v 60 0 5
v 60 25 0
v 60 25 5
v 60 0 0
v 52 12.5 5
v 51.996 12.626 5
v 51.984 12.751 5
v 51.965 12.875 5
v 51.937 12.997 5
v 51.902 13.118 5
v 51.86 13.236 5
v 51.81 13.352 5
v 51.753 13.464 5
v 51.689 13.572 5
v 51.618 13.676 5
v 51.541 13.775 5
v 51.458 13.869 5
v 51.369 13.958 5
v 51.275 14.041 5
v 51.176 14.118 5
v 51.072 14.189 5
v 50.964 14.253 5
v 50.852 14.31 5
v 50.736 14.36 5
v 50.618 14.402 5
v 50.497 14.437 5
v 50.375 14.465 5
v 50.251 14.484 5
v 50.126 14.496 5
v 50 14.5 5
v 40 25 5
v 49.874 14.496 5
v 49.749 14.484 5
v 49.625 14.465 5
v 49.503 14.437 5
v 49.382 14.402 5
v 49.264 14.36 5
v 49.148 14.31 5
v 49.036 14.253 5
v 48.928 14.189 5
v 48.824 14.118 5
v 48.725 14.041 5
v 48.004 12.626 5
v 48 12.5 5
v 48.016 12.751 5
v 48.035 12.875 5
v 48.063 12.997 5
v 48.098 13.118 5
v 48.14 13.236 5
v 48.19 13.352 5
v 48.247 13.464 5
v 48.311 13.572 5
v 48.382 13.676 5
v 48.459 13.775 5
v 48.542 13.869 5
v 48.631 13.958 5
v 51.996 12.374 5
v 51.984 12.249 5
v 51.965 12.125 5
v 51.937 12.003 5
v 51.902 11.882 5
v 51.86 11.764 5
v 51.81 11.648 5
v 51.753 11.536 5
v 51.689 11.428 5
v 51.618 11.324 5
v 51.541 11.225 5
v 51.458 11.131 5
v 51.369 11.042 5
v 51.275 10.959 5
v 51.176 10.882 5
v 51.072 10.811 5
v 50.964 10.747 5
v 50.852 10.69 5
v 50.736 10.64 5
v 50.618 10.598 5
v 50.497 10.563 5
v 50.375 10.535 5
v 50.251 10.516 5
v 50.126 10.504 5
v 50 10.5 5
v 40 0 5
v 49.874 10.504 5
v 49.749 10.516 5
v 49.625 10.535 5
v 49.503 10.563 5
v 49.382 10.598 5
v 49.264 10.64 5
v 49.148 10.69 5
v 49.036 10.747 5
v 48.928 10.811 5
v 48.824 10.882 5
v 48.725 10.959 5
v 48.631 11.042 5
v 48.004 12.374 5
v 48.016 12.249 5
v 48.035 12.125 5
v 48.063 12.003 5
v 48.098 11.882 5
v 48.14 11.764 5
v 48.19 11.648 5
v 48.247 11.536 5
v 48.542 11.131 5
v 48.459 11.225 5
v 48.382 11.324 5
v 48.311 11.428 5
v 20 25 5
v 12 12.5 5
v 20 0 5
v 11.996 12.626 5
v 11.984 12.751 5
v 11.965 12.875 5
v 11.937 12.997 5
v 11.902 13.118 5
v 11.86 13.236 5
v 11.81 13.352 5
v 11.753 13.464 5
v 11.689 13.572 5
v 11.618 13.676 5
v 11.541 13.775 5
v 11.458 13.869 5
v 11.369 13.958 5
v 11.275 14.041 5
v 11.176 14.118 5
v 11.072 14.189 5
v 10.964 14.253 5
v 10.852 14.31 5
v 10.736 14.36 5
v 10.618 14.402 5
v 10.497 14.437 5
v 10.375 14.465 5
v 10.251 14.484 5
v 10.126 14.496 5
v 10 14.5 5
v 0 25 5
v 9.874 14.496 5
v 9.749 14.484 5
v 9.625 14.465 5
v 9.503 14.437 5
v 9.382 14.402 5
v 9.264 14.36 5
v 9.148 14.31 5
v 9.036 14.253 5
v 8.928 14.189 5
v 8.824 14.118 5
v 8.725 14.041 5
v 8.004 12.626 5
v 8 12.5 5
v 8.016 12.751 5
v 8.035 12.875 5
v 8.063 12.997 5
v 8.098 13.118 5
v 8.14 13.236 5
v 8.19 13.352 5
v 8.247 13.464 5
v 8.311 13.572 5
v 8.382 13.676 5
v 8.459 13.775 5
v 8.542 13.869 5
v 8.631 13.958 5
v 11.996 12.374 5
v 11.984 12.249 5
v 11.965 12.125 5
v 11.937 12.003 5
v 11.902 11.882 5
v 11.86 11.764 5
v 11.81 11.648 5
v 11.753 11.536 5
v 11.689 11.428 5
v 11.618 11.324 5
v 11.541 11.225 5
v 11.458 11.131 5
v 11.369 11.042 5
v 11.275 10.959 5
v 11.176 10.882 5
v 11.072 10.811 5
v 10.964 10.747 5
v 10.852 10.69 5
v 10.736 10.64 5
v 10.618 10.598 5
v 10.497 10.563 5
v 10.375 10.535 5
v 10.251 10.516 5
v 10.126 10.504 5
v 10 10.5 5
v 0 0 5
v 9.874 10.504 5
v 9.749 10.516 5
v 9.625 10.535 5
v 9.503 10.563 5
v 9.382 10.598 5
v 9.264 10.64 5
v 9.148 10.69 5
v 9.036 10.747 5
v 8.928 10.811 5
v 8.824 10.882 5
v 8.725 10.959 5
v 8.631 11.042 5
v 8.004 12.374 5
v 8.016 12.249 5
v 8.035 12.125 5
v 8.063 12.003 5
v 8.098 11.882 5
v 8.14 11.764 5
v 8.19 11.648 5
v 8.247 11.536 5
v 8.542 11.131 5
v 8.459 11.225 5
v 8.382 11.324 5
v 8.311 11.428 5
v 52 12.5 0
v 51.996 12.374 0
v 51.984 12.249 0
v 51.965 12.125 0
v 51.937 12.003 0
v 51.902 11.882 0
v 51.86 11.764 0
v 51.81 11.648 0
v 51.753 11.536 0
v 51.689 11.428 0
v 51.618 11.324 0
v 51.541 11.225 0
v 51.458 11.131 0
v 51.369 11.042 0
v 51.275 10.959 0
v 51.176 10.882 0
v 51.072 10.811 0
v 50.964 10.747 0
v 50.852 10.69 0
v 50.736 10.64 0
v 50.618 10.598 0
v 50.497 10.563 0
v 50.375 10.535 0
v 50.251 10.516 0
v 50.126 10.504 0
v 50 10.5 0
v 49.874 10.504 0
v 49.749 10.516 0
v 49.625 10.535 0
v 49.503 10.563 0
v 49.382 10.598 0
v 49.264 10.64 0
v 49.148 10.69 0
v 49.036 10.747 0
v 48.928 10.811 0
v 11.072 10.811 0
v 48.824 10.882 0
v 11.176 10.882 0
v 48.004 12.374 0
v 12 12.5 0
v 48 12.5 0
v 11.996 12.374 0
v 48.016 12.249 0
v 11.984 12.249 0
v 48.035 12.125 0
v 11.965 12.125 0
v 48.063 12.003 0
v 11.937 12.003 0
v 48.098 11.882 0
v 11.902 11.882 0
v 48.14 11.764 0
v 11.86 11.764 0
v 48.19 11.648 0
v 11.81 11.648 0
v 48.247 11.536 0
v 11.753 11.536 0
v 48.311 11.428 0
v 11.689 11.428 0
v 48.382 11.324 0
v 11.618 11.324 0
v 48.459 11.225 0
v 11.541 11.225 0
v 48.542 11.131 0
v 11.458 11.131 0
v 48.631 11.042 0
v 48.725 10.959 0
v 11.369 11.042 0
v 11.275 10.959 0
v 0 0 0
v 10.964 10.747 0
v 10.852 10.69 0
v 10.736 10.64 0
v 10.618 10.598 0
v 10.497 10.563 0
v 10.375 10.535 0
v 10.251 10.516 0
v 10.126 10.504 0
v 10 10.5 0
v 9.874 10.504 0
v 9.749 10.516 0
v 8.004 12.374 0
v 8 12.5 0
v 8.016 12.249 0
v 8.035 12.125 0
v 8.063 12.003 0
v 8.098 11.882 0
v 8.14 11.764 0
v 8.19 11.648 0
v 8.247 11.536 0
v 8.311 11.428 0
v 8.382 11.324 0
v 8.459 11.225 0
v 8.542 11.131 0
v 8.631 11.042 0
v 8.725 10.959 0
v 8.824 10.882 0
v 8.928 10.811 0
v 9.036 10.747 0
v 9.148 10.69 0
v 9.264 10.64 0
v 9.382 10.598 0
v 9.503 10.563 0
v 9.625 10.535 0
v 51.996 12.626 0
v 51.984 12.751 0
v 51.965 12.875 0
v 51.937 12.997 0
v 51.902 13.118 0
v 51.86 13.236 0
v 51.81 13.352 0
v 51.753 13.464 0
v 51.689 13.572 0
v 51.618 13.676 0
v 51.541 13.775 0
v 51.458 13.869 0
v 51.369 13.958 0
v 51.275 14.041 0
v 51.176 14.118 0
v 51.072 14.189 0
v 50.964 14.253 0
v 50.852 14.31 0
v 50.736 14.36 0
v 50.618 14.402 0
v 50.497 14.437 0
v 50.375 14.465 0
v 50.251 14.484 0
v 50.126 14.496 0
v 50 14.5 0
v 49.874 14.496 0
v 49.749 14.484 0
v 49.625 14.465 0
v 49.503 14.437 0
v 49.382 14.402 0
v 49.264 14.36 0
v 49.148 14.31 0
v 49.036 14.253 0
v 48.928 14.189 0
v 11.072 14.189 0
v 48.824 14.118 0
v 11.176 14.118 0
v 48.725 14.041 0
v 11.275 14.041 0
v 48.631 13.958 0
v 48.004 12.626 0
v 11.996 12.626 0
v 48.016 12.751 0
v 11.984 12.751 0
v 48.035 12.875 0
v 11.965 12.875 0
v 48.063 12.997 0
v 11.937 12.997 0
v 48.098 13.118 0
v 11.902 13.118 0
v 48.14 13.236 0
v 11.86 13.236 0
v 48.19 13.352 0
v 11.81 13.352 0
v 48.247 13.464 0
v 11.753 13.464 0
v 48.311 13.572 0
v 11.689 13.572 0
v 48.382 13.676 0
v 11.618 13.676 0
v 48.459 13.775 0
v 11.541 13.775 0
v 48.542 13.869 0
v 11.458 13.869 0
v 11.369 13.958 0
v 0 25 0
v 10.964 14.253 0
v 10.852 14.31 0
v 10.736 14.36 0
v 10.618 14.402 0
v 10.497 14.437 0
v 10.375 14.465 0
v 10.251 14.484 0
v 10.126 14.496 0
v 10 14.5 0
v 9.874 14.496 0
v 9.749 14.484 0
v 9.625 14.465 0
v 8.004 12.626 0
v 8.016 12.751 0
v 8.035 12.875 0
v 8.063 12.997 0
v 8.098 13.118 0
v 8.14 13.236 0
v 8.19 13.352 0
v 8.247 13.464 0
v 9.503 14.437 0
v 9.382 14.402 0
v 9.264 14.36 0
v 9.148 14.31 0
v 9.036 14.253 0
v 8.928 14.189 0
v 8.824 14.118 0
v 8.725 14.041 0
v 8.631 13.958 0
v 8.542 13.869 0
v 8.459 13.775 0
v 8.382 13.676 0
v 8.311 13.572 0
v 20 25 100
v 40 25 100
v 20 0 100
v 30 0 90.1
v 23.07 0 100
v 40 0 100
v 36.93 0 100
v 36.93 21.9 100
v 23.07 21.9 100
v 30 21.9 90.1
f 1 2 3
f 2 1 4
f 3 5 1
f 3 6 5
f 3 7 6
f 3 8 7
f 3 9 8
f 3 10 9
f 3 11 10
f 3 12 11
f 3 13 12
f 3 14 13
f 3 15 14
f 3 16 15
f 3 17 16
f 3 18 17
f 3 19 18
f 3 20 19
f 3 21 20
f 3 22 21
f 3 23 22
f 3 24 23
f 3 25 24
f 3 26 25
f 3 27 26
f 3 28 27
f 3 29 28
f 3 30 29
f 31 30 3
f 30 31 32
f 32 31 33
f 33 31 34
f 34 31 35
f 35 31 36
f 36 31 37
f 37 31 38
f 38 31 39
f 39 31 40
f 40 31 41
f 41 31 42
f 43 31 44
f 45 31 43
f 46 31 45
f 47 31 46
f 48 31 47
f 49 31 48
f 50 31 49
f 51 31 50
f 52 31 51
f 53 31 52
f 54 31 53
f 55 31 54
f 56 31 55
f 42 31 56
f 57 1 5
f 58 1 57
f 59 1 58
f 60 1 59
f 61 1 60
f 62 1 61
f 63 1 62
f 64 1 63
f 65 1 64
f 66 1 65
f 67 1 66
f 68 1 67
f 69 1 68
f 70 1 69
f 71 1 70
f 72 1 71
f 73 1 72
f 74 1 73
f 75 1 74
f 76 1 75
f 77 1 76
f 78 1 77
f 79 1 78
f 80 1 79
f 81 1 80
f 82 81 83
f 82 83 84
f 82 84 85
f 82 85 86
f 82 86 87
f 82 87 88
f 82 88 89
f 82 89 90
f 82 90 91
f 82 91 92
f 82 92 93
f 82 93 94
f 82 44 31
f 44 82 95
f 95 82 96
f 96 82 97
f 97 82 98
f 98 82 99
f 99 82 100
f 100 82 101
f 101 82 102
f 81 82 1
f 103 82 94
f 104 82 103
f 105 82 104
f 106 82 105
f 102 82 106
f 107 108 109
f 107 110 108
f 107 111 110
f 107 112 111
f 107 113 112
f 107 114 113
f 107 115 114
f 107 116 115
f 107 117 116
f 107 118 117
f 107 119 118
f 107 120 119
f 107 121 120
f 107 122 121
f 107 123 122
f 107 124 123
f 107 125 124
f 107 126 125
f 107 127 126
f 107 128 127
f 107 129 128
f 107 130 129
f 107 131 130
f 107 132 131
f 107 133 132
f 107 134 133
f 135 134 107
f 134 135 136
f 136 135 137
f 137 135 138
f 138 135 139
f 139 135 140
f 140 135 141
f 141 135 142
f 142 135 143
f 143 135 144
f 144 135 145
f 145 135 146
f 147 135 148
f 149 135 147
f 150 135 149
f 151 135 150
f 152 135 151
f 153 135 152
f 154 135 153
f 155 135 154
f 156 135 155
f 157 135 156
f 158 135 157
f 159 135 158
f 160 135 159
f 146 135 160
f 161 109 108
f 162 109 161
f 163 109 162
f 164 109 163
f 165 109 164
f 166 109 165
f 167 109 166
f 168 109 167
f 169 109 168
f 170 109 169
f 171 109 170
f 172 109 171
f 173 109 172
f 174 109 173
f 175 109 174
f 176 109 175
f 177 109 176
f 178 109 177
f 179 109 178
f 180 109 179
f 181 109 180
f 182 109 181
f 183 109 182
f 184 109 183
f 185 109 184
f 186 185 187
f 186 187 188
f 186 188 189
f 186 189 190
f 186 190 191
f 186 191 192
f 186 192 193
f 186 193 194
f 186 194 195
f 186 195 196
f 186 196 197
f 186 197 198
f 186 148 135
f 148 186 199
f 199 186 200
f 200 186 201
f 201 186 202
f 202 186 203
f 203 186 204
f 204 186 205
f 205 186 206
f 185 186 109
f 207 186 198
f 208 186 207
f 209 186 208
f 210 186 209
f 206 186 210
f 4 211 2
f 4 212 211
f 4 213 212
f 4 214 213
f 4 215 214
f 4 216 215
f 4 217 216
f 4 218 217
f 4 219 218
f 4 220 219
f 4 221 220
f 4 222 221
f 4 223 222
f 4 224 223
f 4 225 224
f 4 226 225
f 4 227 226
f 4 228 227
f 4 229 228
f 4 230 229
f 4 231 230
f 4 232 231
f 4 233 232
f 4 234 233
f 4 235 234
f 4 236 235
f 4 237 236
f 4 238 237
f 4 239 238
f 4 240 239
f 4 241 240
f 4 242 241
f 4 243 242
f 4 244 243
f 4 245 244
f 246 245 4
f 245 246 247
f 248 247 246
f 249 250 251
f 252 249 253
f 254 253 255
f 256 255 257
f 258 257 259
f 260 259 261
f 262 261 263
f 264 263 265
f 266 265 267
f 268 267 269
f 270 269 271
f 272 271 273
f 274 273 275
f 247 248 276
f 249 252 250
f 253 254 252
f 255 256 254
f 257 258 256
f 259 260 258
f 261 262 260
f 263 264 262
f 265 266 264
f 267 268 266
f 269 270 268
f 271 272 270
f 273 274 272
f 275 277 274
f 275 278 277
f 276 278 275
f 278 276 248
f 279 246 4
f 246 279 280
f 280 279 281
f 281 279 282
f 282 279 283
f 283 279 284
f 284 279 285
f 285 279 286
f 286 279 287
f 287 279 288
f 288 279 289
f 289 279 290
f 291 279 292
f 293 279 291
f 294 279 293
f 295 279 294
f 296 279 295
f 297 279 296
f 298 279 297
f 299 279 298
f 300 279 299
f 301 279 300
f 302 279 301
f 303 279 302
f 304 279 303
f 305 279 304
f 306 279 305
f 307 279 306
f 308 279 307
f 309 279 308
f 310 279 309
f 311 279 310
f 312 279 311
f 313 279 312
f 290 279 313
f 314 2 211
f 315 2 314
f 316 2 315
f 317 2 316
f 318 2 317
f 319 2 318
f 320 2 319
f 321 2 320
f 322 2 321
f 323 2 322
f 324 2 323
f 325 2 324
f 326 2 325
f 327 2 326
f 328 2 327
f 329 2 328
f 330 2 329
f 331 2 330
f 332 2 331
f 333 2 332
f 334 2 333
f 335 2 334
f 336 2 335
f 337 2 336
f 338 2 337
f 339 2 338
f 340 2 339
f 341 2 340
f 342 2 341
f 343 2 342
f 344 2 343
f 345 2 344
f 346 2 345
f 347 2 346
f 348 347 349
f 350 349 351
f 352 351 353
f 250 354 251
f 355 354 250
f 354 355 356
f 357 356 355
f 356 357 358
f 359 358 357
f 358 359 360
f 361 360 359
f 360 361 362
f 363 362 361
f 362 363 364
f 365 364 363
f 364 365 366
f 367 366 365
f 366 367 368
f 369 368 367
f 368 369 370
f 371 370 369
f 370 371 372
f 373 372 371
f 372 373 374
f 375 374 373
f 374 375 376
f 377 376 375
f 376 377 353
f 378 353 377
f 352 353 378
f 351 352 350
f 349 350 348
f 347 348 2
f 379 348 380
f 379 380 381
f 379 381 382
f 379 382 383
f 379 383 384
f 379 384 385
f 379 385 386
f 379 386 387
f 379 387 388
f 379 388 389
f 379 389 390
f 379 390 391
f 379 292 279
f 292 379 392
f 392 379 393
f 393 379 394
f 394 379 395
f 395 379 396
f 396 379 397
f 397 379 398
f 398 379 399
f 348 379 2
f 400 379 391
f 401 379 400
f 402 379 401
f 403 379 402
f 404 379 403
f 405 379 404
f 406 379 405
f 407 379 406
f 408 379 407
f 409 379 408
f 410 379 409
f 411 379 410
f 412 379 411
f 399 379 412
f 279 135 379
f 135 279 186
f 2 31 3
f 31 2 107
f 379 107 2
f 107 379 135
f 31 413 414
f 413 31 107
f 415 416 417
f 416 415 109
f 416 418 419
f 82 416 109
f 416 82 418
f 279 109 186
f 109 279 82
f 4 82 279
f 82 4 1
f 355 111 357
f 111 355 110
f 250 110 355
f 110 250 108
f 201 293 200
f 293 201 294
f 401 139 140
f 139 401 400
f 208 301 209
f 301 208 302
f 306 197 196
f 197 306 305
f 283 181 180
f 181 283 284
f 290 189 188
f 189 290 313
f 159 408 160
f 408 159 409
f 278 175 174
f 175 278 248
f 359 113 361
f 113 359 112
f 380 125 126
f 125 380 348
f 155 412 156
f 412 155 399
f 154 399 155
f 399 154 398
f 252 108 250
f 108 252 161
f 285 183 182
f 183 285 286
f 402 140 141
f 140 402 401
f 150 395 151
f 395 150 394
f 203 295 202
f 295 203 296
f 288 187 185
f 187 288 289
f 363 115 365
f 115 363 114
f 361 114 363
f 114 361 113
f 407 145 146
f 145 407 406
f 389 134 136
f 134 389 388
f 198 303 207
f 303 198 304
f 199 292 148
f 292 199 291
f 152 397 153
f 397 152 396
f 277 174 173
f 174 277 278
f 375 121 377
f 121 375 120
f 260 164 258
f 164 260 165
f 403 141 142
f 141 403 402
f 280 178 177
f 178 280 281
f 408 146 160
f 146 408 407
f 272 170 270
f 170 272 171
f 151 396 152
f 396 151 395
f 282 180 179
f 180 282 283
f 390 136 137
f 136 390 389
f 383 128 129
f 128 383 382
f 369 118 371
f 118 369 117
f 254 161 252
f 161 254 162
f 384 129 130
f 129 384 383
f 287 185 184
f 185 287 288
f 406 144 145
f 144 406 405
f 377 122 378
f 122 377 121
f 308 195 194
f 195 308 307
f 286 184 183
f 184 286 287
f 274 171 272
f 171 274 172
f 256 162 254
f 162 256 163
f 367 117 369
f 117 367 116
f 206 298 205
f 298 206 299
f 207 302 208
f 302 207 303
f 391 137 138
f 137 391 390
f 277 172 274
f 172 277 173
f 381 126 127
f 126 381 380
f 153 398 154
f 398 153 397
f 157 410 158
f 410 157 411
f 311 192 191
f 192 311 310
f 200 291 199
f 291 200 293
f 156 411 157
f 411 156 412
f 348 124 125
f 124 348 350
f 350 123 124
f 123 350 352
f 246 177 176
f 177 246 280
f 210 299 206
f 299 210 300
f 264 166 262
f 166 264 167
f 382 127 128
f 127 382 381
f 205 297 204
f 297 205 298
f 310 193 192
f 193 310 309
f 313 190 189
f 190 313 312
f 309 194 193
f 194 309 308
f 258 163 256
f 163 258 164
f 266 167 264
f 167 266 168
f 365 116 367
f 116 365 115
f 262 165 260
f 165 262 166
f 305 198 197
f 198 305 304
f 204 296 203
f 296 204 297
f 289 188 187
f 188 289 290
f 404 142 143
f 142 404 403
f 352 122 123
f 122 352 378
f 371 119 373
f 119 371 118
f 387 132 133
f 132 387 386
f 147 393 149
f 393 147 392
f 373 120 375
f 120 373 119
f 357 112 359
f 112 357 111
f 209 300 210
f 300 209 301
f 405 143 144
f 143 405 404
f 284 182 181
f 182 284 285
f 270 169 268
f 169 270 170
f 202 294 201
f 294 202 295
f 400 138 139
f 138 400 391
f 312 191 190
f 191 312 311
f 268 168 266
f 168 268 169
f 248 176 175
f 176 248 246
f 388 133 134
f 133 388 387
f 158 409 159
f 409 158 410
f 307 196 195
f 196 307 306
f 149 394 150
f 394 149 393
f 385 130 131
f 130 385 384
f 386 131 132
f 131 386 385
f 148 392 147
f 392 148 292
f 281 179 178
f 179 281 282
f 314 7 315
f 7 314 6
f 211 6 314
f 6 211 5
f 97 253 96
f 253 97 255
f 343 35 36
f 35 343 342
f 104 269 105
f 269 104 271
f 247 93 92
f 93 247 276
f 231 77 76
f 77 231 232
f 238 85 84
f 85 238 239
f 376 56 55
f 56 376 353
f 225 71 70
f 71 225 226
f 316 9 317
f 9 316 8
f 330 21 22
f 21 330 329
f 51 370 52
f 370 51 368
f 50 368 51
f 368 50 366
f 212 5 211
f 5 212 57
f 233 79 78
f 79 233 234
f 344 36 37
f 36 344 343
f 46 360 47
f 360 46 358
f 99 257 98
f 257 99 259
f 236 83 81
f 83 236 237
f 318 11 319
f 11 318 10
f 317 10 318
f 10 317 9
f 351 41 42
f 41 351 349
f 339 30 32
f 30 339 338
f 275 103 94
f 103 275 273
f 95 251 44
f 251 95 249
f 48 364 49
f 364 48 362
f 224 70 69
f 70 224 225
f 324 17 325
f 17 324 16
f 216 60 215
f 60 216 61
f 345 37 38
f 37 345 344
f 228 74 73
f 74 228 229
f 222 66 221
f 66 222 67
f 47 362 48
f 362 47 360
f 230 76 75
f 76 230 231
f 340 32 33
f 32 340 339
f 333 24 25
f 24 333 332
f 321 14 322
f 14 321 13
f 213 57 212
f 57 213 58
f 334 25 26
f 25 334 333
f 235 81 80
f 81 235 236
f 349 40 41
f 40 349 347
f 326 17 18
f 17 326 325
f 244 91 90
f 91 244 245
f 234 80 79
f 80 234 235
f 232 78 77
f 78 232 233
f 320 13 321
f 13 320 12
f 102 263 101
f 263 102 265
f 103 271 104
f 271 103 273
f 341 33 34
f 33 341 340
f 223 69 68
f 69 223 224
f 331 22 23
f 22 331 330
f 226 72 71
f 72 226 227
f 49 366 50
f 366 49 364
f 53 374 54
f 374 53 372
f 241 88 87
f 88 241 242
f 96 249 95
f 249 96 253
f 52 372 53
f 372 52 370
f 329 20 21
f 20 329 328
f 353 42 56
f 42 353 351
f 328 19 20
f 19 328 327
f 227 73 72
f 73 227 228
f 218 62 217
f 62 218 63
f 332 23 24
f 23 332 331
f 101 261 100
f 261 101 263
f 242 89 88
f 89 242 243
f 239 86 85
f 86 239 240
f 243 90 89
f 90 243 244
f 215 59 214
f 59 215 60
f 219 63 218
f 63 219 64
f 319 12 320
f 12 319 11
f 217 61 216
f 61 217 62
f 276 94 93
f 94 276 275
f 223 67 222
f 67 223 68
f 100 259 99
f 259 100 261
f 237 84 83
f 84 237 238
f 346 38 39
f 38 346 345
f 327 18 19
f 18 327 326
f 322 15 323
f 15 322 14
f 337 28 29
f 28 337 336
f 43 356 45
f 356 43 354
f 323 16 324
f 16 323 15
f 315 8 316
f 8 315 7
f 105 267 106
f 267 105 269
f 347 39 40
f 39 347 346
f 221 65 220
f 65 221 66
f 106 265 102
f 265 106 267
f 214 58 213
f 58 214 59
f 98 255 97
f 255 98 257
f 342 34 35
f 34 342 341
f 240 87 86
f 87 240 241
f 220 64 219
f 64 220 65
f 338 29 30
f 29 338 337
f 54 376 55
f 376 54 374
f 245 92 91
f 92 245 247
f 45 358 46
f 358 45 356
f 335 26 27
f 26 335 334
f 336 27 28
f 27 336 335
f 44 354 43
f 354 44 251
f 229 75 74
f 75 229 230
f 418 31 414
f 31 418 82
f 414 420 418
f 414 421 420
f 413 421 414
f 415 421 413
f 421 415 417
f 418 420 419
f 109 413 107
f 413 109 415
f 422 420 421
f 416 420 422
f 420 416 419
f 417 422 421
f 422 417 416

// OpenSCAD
// file: configure.scad
/*
 * file: configure.scad
 * author: gregor binder <gregor_reprap@catrix.at>
 * date: 26.1.2014
 * last change: 26.1.2014
 * license: CC BY-NC-SA 4.0
 * changelog:
 *	- switched from freecad to openscad
 */

bottomwidth=60;
bottomheight=5;
depth=25;
height=100-bottomheight;
width=20;
holediameter=4;
thickness=3;
holderdepth=10;
$fn=100;

extender_width=90;
extender_height=25;
extender_top_hole=3;
extender_top_hole_depth=5;
extender_strengthening_d=10;
// main file
/*
 * file: prusa-i3-filament-holder-v2.scad
 * author: gregor binder <gregor_reprap@catrix.at>
 * date: 13.11.2013
 * last change: 26.1.2014
 * license: CC BY-NC-SA 4.0
 * changelog:
 *	- switched from freecad to openscad
 */

include <configure.scad>

difference() {
	cube([bottomwidth,depth,bottomheight]);
	translate([((bottomwidth-width)/2)/2,depth/2,-0.5])
		cylinder(h=bottomheight+5,r=holediameter/2);
	translate([bottomwidth-(((bottomwidth-width)/2)/2),depth/2,-0.5])
		cylinder(h=bottomheight+5,r=holediameter/2);
}

translate([(bottomwidth-width)/2,0,bottomheight])
difference() {
	cube([width,depth,height]);
	translate([(width/2)-((width-(thickness*2))/2),-0.1,height+0.1])
		rotate([-90,0,0])
	linear_extrude(height = depth-thickness)
		polygon(points=[[0,0],[width-(thickness*2),0],[(width-(thickness*2))/2,holderdepth]], paths=[[0,1,2]]);
}
